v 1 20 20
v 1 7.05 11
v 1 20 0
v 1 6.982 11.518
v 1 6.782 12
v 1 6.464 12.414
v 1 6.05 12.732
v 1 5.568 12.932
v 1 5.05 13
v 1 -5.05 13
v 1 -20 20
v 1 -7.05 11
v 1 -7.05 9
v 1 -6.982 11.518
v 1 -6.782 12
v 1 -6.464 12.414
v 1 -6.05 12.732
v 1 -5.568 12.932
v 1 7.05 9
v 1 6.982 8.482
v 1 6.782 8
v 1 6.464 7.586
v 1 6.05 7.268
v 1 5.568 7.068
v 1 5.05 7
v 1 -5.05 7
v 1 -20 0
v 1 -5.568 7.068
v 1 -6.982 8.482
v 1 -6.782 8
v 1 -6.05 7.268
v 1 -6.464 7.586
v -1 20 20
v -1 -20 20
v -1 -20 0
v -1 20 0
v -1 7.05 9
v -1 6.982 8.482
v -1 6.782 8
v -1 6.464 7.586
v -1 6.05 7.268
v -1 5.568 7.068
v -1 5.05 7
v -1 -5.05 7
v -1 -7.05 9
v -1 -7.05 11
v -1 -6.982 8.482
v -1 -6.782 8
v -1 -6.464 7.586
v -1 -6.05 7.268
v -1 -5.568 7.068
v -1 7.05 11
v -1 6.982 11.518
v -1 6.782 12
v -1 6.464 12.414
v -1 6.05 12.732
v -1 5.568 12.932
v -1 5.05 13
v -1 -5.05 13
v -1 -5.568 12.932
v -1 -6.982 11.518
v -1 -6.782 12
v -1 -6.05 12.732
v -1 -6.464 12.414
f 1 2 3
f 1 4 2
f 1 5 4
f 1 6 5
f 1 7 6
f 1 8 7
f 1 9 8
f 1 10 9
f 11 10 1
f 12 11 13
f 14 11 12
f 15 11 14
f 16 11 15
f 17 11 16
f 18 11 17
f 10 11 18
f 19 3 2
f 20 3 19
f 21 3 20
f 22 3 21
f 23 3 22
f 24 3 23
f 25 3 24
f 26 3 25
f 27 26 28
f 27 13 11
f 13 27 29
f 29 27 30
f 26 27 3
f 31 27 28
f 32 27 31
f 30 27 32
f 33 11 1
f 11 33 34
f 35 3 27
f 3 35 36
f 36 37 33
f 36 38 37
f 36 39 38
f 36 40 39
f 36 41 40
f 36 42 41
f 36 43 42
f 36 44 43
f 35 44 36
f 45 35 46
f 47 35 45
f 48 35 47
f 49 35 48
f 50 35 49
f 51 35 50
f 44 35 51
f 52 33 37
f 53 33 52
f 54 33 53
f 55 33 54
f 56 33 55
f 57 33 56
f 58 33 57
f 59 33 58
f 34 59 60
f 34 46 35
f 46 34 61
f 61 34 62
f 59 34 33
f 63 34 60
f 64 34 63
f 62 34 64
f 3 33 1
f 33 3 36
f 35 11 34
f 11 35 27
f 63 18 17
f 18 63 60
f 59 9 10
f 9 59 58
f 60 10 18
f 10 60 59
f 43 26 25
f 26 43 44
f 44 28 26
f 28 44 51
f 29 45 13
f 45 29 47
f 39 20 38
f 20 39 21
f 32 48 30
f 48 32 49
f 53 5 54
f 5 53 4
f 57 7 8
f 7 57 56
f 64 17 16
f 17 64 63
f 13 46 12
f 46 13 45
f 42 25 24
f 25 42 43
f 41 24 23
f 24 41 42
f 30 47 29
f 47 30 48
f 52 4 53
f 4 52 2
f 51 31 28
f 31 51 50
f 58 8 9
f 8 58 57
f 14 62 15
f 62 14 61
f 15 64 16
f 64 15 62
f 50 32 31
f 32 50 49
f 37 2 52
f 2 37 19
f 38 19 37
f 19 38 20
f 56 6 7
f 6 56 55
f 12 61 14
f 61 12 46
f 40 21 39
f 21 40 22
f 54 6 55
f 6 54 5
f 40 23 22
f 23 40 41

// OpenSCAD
// Standalone USB-C Test Coupon
// Horizontal orientation: 14.1mm horizontal width along wall, 6.0mm vertical height, 2.0mm flat vertical ends

$fn = 32;

// USB-C parameters:
// - Width (horizontal along wall): 14.1 mm
// - Height (vertical): 6.0 mm
// - Flat vertical section at left/right ends: 2.0 mm (33.3% of 6.0mm)
// - Top & bottom corner fillets: 2.0 mm radius
usb_w = 14.1;
usb_h = 6.0;
flat_h = 2.0; // 2.0 mm flat vertical height in middle of left and right ends
corner_r = (usb_h - flat_h) / 2; // 2.0 mm radius

plate_w = 40.0;
plate_h = 20.0;
plate_t = 2.0;

module usb_c_profile_2d() {
    dy = usb_w / 2 - corner_r; // 5.05 mm along Y (horizontal)
    dz = flat_h / 2;           // 1.0 mm along X (vertical in 3D)
    
    // When rotated around Y with rotate([0, 90, 0]):
    // 2D Y maps to 3D Y (horizontal along plate width)
    // 2D X maps to 3D Z (vertical along plate height)
    hull() {
        translate([-dz, -dy]) circle(r = corner_r, $fn = 24);
        translate([ dz, -dy]) circle(r = corner_r, $fn = 24);
        translate([-dz,  dy]) circle(r = corner_r, $fn = 24);
        translate([ dz,  dy]) circle(r = corner_r, $fn = 24);
    }
}

module coupon_usb_c() {
    difference() {
        // Flat rectangular plate 40 x 20 x 2 mm
        translate([0, 0, plate_h / 2])
            cube([plate_t, plate_w, plate_h], center = true);
                
        // Centered horizontal USB-C through-hole cutout (14.1mm horizontal x 6.0mm vertical)
        translate([0, 0, plate_h / 2])
            rotate([0, 90, 0])
                linear_extrude(height = plate_t + 4.0, center = true)
                    usb_c_profile_2d();
    }
}

coupon_usb_c();
